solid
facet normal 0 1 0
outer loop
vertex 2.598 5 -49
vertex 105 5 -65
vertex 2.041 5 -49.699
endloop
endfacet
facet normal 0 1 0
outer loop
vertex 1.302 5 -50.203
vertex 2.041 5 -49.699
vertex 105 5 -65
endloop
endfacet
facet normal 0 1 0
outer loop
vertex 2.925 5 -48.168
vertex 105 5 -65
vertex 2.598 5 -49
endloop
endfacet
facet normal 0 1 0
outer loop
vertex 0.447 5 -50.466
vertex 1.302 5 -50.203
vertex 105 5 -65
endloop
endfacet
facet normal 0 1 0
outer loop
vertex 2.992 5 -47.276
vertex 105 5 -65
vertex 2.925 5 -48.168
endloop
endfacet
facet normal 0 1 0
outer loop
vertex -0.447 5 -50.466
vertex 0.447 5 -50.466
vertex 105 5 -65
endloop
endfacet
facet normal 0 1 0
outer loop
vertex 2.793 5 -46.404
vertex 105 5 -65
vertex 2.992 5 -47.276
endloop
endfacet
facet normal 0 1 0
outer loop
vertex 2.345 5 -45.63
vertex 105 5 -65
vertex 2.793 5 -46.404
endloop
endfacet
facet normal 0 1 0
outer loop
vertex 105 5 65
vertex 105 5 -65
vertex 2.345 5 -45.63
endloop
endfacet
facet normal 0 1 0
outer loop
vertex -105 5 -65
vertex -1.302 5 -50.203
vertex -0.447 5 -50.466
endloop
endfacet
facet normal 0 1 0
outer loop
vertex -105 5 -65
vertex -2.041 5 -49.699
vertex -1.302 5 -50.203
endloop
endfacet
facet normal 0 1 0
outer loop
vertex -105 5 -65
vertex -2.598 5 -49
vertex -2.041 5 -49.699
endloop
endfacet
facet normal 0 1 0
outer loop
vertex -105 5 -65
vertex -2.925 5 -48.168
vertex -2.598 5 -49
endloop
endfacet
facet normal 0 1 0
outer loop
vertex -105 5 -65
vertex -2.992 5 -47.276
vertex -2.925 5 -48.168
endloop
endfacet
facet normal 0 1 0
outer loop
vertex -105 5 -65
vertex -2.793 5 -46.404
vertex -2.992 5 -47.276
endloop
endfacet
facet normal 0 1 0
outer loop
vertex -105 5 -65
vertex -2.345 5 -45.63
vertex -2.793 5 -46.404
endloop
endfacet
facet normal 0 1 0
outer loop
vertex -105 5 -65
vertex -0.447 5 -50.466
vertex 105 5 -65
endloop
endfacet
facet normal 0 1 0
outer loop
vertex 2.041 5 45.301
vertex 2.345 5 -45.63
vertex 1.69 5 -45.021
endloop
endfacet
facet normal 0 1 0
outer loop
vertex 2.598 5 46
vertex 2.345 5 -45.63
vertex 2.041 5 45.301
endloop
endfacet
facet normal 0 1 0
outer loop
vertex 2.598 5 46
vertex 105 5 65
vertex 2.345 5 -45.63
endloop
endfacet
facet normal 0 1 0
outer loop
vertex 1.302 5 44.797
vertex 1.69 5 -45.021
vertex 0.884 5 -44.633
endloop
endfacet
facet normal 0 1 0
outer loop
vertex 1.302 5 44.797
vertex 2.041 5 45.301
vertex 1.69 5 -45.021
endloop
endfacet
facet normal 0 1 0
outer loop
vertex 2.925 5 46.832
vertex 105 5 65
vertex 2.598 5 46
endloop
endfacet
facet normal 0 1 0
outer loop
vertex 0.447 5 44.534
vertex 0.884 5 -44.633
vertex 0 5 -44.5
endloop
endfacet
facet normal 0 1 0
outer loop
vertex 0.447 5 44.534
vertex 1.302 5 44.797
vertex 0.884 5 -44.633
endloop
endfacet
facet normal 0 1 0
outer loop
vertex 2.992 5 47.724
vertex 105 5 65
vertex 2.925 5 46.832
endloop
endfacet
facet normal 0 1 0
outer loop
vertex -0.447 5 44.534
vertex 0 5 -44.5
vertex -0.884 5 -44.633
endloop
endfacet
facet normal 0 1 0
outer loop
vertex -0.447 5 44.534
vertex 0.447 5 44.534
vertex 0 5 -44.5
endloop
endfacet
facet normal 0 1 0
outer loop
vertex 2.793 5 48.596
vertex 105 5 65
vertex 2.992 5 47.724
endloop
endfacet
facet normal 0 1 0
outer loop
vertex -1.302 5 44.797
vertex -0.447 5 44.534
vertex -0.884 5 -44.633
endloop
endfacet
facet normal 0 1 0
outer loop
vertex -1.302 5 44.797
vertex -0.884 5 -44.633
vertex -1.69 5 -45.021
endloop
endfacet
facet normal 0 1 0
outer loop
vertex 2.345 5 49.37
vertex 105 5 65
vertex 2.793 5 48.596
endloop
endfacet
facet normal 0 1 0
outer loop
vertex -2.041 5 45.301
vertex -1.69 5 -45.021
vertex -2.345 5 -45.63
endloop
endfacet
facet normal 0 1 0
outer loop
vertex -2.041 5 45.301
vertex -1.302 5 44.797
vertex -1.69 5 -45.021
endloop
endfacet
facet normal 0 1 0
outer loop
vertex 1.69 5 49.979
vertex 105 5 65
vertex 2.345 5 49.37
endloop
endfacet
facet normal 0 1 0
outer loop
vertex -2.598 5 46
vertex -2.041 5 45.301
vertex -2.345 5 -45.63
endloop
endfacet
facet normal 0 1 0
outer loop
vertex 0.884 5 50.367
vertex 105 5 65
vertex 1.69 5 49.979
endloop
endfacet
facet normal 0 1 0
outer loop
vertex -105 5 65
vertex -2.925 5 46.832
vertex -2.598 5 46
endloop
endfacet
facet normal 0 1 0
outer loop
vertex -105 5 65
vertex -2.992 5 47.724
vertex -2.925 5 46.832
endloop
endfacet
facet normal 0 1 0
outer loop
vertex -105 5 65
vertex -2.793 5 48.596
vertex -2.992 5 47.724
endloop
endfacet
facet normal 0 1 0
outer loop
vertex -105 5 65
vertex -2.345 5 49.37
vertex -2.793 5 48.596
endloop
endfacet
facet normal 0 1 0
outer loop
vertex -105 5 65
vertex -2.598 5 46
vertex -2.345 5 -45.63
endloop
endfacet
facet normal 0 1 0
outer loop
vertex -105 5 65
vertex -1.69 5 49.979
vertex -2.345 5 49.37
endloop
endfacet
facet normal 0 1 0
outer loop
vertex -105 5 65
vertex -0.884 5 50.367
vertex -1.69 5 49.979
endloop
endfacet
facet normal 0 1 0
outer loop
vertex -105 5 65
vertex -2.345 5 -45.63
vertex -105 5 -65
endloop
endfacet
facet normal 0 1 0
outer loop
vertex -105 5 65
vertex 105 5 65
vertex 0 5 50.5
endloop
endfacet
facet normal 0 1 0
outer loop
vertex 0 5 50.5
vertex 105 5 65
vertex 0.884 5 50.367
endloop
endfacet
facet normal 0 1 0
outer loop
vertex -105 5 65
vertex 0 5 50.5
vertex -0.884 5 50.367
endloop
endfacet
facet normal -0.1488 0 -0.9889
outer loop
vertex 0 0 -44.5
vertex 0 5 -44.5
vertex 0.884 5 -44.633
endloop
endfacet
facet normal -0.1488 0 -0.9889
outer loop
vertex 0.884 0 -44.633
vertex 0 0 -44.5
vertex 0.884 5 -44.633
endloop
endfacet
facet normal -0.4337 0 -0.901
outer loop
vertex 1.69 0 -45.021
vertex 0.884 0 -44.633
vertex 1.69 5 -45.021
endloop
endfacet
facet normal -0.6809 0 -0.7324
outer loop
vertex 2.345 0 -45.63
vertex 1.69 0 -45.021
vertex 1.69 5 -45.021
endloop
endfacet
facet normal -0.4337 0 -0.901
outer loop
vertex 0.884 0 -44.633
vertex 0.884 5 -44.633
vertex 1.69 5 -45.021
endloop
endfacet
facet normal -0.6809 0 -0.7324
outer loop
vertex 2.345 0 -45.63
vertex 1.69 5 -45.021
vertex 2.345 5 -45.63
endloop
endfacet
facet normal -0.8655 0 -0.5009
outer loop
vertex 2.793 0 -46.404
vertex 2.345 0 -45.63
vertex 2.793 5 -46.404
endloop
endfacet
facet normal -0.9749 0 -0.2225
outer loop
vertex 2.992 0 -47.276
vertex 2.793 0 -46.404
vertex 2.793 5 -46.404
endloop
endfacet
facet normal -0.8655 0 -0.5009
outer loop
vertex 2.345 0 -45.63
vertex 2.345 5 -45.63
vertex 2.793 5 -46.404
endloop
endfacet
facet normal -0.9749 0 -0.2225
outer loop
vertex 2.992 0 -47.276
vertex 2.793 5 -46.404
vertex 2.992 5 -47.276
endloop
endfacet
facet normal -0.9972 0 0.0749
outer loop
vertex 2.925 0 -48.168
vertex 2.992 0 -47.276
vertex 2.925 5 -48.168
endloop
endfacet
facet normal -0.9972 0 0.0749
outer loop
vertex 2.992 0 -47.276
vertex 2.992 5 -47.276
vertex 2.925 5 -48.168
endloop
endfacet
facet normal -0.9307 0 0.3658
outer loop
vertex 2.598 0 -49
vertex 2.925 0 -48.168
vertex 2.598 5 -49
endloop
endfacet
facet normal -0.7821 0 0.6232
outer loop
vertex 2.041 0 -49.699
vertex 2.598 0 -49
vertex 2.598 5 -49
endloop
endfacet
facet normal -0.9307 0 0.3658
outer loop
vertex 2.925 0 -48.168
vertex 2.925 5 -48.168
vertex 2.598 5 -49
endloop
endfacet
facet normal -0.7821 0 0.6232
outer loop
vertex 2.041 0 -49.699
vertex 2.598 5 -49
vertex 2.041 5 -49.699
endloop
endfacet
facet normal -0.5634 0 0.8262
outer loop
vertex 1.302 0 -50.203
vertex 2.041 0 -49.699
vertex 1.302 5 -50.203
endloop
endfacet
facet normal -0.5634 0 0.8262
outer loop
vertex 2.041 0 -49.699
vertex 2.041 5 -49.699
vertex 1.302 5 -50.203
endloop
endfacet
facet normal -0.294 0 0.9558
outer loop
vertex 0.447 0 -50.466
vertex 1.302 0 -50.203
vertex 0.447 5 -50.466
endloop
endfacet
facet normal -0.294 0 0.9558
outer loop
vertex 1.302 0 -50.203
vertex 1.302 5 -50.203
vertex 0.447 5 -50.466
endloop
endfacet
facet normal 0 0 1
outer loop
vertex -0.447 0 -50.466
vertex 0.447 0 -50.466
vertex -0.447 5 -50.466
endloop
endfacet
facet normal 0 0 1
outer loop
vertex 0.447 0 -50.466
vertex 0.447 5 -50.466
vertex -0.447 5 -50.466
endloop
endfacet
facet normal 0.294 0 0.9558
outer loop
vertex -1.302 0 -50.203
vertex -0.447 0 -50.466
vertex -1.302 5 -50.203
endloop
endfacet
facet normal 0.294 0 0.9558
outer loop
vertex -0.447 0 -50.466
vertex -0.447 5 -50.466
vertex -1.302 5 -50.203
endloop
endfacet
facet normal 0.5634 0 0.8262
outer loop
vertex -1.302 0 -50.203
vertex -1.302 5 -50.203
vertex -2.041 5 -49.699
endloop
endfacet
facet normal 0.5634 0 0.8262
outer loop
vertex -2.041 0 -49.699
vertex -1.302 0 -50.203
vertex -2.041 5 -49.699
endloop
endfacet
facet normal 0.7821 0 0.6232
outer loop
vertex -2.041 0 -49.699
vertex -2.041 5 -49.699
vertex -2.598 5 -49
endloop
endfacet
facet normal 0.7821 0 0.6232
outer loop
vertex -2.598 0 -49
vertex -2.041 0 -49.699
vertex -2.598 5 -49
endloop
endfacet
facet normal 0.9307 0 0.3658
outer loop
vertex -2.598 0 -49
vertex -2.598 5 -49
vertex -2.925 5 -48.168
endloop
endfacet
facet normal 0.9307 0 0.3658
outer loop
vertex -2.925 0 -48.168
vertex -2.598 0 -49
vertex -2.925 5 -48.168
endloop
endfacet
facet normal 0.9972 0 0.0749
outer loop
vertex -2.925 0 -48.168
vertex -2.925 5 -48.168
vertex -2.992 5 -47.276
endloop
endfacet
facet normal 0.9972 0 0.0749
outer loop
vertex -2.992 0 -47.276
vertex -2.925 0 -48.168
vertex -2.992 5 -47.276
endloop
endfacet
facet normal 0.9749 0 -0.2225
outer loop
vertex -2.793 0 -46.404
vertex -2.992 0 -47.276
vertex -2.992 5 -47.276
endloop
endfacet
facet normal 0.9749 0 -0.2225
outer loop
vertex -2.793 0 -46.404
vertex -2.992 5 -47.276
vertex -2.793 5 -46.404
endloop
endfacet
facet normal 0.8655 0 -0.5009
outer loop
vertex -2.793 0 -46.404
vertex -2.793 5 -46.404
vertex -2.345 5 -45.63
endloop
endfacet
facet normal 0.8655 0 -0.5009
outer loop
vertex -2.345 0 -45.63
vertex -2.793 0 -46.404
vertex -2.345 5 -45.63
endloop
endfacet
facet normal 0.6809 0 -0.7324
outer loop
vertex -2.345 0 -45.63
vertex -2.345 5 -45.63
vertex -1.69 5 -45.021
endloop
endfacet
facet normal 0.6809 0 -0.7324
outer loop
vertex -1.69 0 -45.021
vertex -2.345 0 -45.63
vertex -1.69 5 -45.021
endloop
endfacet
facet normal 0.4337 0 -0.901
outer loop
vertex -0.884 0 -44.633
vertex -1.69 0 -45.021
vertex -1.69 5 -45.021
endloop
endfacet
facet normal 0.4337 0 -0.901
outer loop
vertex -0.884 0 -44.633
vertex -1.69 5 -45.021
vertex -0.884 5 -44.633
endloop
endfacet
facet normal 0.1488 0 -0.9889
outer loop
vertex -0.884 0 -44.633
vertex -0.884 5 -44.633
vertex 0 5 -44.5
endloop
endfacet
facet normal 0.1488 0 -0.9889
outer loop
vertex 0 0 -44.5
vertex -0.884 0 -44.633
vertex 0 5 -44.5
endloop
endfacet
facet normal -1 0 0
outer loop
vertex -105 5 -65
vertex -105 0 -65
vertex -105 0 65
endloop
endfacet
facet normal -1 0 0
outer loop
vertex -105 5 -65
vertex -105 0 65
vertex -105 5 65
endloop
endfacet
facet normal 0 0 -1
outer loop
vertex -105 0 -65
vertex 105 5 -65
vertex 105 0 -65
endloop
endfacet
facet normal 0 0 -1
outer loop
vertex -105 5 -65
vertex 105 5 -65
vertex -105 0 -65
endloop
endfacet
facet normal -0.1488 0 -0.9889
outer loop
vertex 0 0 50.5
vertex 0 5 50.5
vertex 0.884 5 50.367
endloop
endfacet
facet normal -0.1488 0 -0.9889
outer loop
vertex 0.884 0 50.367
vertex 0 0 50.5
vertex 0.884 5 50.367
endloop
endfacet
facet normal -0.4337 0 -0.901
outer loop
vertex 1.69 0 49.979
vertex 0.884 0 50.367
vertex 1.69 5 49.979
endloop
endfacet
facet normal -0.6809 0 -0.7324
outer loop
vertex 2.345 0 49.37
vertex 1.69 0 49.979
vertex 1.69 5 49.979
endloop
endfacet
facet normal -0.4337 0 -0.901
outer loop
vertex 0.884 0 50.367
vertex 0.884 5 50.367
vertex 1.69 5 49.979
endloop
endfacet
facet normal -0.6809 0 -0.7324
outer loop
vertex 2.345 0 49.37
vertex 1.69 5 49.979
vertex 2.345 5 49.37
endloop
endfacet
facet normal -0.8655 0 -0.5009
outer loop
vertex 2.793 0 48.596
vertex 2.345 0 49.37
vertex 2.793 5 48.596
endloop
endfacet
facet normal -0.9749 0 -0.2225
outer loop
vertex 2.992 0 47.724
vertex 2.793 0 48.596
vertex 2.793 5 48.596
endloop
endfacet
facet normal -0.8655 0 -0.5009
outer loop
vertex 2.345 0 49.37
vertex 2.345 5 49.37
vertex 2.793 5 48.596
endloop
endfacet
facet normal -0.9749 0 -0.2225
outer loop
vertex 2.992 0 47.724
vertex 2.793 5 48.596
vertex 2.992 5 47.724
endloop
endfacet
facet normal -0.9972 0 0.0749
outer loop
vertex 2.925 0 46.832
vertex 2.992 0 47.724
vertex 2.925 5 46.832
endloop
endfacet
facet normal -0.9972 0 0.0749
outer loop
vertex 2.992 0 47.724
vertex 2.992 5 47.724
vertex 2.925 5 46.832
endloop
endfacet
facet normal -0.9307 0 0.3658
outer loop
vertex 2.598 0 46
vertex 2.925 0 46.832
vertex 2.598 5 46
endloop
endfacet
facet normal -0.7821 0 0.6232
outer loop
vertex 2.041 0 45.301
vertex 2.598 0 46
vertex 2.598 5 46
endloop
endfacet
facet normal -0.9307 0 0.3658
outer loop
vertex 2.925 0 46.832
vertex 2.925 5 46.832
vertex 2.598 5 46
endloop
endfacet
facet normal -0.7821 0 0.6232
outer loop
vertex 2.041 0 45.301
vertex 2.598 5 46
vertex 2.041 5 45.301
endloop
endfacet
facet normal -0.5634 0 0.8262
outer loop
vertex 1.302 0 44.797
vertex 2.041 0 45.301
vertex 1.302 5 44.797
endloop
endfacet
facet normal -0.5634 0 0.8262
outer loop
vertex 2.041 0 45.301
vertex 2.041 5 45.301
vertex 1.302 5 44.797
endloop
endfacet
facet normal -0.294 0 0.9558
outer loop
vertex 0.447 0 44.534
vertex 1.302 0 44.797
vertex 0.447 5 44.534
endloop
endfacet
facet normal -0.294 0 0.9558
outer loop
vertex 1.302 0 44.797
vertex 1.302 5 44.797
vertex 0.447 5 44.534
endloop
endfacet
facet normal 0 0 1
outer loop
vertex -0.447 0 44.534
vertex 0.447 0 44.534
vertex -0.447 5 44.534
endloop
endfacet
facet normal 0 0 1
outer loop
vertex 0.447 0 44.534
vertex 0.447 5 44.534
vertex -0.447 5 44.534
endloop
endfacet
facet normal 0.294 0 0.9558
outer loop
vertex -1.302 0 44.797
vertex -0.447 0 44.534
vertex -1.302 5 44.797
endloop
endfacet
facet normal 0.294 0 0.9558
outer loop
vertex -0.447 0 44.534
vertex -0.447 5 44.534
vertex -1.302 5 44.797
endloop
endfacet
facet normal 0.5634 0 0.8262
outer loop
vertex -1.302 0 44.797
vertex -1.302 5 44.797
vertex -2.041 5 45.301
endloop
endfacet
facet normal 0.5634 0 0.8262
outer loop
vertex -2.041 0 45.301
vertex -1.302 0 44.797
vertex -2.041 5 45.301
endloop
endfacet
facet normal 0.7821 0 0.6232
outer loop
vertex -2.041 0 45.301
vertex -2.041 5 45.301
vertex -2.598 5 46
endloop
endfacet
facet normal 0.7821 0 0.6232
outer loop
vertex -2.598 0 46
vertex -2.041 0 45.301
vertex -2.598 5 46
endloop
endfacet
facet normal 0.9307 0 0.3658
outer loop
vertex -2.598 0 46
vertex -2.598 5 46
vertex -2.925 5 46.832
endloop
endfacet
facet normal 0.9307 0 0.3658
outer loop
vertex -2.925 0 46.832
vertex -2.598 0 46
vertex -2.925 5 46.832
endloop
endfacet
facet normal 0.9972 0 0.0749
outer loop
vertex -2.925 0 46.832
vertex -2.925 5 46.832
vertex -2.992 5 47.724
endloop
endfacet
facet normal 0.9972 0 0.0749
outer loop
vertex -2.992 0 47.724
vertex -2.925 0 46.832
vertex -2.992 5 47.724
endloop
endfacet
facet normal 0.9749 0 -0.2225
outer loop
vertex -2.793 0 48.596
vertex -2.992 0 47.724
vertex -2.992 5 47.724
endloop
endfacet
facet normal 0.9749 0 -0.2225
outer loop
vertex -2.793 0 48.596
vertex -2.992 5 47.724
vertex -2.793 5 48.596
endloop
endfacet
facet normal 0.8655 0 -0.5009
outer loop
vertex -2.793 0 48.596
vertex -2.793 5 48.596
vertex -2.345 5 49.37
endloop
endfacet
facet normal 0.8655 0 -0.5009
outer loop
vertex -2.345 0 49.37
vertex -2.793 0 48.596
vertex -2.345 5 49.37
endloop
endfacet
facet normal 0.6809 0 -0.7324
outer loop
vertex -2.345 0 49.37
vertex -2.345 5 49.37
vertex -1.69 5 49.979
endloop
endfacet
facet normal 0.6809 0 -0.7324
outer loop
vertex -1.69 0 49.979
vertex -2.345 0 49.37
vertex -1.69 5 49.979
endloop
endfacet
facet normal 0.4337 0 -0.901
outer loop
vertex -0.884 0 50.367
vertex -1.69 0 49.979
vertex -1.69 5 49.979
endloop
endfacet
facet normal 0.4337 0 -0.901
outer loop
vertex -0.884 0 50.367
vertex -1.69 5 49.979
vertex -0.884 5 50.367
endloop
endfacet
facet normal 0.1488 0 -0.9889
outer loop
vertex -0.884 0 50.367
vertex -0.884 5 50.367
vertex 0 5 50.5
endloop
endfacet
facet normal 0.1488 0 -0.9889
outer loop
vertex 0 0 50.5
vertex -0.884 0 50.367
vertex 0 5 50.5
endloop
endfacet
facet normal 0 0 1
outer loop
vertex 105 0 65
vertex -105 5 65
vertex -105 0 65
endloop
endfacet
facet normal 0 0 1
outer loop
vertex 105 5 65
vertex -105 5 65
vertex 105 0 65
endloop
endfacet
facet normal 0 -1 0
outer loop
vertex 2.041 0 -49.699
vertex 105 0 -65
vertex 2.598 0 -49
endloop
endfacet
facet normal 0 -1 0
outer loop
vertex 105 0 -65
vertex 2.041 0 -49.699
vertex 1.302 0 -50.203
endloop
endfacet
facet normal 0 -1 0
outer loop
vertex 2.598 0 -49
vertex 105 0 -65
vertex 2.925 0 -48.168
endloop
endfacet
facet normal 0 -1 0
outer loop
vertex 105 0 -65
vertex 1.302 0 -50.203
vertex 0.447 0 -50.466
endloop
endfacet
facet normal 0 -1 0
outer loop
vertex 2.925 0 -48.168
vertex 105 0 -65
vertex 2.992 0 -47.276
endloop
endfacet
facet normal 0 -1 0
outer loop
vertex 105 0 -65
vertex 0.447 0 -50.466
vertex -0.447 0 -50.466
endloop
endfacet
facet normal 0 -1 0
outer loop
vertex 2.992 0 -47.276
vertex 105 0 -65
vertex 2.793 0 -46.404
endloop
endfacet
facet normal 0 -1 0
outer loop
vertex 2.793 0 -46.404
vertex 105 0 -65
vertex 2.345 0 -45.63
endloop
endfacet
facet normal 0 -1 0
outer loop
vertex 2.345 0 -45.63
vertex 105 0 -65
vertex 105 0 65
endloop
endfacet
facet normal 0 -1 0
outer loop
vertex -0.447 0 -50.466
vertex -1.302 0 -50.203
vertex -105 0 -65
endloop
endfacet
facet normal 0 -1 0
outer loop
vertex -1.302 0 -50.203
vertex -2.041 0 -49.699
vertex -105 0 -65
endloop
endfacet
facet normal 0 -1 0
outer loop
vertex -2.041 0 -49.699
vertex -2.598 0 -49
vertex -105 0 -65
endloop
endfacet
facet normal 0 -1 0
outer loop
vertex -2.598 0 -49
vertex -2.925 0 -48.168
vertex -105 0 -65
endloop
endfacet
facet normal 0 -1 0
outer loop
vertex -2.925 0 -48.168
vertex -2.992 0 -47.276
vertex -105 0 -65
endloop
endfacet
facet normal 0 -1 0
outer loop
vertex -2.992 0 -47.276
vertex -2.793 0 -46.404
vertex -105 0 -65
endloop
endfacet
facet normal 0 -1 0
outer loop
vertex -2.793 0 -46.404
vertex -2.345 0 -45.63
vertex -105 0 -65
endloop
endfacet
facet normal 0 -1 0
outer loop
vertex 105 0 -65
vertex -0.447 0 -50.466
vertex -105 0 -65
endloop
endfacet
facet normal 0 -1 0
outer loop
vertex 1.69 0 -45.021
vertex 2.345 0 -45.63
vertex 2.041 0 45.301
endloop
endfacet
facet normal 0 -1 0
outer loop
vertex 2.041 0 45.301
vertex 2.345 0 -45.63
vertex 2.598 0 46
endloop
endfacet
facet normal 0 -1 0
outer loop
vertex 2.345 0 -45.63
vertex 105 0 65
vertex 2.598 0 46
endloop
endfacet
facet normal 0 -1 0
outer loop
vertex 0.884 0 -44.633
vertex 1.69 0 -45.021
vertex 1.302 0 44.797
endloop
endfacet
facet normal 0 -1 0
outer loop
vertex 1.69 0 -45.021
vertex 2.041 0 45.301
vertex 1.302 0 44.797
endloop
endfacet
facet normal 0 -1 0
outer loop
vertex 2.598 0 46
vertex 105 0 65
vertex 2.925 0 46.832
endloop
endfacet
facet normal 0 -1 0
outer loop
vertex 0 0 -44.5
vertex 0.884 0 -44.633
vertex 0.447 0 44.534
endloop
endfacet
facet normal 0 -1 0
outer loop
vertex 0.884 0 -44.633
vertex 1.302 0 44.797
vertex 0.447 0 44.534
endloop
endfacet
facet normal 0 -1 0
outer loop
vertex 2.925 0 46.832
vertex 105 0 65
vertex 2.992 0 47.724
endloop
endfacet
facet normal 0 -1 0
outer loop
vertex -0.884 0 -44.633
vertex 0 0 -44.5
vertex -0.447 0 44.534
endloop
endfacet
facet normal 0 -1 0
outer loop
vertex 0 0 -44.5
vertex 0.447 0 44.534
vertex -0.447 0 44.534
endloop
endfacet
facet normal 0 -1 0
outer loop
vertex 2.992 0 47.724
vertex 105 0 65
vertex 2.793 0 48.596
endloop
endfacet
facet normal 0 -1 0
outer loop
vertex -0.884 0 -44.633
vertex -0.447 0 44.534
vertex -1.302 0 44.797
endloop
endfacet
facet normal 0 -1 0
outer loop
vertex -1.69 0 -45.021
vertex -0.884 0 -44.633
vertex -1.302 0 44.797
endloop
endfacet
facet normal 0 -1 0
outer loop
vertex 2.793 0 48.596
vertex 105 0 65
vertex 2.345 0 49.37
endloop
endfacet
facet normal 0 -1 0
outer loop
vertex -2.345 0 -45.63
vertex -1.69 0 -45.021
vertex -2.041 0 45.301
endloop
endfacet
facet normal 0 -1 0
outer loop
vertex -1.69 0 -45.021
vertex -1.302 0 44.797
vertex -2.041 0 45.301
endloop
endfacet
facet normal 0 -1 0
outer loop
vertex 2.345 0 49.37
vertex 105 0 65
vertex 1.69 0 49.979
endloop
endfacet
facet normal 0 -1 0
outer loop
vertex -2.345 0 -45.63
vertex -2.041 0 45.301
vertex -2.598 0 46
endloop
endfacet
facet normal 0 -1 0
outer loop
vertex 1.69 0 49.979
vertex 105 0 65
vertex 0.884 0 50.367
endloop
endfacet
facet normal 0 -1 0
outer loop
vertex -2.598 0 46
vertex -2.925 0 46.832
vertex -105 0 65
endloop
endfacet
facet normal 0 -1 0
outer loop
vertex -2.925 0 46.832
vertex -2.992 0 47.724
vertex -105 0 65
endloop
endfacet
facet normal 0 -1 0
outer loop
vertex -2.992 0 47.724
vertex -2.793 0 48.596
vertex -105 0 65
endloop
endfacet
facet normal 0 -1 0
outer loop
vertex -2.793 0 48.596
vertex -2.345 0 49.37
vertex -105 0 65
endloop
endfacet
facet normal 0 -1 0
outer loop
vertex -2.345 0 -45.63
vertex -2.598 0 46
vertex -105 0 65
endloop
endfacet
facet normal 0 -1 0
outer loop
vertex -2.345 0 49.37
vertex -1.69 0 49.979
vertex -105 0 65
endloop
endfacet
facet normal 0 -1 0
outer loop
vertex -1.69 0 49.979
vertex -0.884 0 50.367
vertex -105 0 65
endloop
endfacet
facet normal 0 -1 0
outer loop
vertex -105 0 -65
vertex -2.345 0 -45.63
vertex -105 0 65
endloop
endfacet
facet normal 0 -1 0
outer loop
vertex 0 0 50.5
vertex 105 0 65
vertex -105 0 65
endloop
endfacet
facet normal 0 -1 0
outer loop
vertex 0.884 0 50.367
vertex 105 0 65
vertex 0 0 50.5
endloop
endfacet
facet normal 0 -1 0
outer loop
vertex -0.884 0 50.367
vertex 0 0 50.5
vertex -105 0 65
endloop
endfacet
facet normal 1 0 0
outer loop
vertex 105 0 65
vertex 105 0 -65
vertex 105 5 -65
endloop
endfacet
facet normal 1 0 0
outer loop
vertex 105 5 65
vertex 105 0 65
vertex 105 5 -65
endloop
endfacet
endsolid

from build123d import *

# Parameters (mm, degrees)
SKETCH1_W           = 210
SKETCH1_H           = 120
BOSS_EXTRUDE1_DEPTH = 5
SKETCH3_R           = 3
CUT_EXTRUDE1_DEPTH  = 10
SKETCH4_W           = 210
SKETCH4_H           = 5
BOSS_EXTRUDE2_DEPTH = 5
SKETCH5_W           = 210
SKETCH5_H           = 5
BOSS_EXTRUDE3_DEPTH = 5


with BuildPart() as part:
    # Sketch1 → Boss-Extrude1 (new body)
    with BuildSketch(Plane(origin=(0, 0, 0), x_dir=(1, 0, 0), z_dir=(0, 1, 0))):
        Rectangle(SKETCH1_W, SKETCH1_H)
    extrude(amount=BOSS_EXTRUDE1_DEPTH)

    # Sketch3 → Cut-Extrude1 (cut)
    with BuildSketch(Plane(origin=(0, 5, 0), x_dir=(1, 0, 0), z_dir=(0, 1, 0))):
        with Locations(Location((0, 47.5, 0), (0, 0, 270))):
            Circle(SKETCH3_R)
        with Locations(Location((0, -47.5, 0), (0, 0, 270))):
            Circle(SKETCH3_R)
    extrude(amount=-CUT_EXTRUDE1_DEPTH, mode=Mode.SUBTRACT)

    # Sketch4 → Boss-Extrude2 (add)
    with BuildSketch(Plane.XY.offset(60)):
        with Locations((0, 2.5)):
            Rectangle(SKETCH4_W, SKETCH4_H)
    extrude(amount=BOSS_EXTRUDE2_DEPTH)

    # Sketch5 → Boss-Extrude3 (add)
    with BuildSketch(Plane(origin=(0, 0, -60), x_dir=(-1, 0, 0), z_dir=(0, 0, -1))):
        with Locations((0, 2.5)):
            Rectangle(SKETCH5_W, SKETCH5_H)
    extrude(amount=BOSS_EXTRUDE3_DEPTH)


solid = part.part
